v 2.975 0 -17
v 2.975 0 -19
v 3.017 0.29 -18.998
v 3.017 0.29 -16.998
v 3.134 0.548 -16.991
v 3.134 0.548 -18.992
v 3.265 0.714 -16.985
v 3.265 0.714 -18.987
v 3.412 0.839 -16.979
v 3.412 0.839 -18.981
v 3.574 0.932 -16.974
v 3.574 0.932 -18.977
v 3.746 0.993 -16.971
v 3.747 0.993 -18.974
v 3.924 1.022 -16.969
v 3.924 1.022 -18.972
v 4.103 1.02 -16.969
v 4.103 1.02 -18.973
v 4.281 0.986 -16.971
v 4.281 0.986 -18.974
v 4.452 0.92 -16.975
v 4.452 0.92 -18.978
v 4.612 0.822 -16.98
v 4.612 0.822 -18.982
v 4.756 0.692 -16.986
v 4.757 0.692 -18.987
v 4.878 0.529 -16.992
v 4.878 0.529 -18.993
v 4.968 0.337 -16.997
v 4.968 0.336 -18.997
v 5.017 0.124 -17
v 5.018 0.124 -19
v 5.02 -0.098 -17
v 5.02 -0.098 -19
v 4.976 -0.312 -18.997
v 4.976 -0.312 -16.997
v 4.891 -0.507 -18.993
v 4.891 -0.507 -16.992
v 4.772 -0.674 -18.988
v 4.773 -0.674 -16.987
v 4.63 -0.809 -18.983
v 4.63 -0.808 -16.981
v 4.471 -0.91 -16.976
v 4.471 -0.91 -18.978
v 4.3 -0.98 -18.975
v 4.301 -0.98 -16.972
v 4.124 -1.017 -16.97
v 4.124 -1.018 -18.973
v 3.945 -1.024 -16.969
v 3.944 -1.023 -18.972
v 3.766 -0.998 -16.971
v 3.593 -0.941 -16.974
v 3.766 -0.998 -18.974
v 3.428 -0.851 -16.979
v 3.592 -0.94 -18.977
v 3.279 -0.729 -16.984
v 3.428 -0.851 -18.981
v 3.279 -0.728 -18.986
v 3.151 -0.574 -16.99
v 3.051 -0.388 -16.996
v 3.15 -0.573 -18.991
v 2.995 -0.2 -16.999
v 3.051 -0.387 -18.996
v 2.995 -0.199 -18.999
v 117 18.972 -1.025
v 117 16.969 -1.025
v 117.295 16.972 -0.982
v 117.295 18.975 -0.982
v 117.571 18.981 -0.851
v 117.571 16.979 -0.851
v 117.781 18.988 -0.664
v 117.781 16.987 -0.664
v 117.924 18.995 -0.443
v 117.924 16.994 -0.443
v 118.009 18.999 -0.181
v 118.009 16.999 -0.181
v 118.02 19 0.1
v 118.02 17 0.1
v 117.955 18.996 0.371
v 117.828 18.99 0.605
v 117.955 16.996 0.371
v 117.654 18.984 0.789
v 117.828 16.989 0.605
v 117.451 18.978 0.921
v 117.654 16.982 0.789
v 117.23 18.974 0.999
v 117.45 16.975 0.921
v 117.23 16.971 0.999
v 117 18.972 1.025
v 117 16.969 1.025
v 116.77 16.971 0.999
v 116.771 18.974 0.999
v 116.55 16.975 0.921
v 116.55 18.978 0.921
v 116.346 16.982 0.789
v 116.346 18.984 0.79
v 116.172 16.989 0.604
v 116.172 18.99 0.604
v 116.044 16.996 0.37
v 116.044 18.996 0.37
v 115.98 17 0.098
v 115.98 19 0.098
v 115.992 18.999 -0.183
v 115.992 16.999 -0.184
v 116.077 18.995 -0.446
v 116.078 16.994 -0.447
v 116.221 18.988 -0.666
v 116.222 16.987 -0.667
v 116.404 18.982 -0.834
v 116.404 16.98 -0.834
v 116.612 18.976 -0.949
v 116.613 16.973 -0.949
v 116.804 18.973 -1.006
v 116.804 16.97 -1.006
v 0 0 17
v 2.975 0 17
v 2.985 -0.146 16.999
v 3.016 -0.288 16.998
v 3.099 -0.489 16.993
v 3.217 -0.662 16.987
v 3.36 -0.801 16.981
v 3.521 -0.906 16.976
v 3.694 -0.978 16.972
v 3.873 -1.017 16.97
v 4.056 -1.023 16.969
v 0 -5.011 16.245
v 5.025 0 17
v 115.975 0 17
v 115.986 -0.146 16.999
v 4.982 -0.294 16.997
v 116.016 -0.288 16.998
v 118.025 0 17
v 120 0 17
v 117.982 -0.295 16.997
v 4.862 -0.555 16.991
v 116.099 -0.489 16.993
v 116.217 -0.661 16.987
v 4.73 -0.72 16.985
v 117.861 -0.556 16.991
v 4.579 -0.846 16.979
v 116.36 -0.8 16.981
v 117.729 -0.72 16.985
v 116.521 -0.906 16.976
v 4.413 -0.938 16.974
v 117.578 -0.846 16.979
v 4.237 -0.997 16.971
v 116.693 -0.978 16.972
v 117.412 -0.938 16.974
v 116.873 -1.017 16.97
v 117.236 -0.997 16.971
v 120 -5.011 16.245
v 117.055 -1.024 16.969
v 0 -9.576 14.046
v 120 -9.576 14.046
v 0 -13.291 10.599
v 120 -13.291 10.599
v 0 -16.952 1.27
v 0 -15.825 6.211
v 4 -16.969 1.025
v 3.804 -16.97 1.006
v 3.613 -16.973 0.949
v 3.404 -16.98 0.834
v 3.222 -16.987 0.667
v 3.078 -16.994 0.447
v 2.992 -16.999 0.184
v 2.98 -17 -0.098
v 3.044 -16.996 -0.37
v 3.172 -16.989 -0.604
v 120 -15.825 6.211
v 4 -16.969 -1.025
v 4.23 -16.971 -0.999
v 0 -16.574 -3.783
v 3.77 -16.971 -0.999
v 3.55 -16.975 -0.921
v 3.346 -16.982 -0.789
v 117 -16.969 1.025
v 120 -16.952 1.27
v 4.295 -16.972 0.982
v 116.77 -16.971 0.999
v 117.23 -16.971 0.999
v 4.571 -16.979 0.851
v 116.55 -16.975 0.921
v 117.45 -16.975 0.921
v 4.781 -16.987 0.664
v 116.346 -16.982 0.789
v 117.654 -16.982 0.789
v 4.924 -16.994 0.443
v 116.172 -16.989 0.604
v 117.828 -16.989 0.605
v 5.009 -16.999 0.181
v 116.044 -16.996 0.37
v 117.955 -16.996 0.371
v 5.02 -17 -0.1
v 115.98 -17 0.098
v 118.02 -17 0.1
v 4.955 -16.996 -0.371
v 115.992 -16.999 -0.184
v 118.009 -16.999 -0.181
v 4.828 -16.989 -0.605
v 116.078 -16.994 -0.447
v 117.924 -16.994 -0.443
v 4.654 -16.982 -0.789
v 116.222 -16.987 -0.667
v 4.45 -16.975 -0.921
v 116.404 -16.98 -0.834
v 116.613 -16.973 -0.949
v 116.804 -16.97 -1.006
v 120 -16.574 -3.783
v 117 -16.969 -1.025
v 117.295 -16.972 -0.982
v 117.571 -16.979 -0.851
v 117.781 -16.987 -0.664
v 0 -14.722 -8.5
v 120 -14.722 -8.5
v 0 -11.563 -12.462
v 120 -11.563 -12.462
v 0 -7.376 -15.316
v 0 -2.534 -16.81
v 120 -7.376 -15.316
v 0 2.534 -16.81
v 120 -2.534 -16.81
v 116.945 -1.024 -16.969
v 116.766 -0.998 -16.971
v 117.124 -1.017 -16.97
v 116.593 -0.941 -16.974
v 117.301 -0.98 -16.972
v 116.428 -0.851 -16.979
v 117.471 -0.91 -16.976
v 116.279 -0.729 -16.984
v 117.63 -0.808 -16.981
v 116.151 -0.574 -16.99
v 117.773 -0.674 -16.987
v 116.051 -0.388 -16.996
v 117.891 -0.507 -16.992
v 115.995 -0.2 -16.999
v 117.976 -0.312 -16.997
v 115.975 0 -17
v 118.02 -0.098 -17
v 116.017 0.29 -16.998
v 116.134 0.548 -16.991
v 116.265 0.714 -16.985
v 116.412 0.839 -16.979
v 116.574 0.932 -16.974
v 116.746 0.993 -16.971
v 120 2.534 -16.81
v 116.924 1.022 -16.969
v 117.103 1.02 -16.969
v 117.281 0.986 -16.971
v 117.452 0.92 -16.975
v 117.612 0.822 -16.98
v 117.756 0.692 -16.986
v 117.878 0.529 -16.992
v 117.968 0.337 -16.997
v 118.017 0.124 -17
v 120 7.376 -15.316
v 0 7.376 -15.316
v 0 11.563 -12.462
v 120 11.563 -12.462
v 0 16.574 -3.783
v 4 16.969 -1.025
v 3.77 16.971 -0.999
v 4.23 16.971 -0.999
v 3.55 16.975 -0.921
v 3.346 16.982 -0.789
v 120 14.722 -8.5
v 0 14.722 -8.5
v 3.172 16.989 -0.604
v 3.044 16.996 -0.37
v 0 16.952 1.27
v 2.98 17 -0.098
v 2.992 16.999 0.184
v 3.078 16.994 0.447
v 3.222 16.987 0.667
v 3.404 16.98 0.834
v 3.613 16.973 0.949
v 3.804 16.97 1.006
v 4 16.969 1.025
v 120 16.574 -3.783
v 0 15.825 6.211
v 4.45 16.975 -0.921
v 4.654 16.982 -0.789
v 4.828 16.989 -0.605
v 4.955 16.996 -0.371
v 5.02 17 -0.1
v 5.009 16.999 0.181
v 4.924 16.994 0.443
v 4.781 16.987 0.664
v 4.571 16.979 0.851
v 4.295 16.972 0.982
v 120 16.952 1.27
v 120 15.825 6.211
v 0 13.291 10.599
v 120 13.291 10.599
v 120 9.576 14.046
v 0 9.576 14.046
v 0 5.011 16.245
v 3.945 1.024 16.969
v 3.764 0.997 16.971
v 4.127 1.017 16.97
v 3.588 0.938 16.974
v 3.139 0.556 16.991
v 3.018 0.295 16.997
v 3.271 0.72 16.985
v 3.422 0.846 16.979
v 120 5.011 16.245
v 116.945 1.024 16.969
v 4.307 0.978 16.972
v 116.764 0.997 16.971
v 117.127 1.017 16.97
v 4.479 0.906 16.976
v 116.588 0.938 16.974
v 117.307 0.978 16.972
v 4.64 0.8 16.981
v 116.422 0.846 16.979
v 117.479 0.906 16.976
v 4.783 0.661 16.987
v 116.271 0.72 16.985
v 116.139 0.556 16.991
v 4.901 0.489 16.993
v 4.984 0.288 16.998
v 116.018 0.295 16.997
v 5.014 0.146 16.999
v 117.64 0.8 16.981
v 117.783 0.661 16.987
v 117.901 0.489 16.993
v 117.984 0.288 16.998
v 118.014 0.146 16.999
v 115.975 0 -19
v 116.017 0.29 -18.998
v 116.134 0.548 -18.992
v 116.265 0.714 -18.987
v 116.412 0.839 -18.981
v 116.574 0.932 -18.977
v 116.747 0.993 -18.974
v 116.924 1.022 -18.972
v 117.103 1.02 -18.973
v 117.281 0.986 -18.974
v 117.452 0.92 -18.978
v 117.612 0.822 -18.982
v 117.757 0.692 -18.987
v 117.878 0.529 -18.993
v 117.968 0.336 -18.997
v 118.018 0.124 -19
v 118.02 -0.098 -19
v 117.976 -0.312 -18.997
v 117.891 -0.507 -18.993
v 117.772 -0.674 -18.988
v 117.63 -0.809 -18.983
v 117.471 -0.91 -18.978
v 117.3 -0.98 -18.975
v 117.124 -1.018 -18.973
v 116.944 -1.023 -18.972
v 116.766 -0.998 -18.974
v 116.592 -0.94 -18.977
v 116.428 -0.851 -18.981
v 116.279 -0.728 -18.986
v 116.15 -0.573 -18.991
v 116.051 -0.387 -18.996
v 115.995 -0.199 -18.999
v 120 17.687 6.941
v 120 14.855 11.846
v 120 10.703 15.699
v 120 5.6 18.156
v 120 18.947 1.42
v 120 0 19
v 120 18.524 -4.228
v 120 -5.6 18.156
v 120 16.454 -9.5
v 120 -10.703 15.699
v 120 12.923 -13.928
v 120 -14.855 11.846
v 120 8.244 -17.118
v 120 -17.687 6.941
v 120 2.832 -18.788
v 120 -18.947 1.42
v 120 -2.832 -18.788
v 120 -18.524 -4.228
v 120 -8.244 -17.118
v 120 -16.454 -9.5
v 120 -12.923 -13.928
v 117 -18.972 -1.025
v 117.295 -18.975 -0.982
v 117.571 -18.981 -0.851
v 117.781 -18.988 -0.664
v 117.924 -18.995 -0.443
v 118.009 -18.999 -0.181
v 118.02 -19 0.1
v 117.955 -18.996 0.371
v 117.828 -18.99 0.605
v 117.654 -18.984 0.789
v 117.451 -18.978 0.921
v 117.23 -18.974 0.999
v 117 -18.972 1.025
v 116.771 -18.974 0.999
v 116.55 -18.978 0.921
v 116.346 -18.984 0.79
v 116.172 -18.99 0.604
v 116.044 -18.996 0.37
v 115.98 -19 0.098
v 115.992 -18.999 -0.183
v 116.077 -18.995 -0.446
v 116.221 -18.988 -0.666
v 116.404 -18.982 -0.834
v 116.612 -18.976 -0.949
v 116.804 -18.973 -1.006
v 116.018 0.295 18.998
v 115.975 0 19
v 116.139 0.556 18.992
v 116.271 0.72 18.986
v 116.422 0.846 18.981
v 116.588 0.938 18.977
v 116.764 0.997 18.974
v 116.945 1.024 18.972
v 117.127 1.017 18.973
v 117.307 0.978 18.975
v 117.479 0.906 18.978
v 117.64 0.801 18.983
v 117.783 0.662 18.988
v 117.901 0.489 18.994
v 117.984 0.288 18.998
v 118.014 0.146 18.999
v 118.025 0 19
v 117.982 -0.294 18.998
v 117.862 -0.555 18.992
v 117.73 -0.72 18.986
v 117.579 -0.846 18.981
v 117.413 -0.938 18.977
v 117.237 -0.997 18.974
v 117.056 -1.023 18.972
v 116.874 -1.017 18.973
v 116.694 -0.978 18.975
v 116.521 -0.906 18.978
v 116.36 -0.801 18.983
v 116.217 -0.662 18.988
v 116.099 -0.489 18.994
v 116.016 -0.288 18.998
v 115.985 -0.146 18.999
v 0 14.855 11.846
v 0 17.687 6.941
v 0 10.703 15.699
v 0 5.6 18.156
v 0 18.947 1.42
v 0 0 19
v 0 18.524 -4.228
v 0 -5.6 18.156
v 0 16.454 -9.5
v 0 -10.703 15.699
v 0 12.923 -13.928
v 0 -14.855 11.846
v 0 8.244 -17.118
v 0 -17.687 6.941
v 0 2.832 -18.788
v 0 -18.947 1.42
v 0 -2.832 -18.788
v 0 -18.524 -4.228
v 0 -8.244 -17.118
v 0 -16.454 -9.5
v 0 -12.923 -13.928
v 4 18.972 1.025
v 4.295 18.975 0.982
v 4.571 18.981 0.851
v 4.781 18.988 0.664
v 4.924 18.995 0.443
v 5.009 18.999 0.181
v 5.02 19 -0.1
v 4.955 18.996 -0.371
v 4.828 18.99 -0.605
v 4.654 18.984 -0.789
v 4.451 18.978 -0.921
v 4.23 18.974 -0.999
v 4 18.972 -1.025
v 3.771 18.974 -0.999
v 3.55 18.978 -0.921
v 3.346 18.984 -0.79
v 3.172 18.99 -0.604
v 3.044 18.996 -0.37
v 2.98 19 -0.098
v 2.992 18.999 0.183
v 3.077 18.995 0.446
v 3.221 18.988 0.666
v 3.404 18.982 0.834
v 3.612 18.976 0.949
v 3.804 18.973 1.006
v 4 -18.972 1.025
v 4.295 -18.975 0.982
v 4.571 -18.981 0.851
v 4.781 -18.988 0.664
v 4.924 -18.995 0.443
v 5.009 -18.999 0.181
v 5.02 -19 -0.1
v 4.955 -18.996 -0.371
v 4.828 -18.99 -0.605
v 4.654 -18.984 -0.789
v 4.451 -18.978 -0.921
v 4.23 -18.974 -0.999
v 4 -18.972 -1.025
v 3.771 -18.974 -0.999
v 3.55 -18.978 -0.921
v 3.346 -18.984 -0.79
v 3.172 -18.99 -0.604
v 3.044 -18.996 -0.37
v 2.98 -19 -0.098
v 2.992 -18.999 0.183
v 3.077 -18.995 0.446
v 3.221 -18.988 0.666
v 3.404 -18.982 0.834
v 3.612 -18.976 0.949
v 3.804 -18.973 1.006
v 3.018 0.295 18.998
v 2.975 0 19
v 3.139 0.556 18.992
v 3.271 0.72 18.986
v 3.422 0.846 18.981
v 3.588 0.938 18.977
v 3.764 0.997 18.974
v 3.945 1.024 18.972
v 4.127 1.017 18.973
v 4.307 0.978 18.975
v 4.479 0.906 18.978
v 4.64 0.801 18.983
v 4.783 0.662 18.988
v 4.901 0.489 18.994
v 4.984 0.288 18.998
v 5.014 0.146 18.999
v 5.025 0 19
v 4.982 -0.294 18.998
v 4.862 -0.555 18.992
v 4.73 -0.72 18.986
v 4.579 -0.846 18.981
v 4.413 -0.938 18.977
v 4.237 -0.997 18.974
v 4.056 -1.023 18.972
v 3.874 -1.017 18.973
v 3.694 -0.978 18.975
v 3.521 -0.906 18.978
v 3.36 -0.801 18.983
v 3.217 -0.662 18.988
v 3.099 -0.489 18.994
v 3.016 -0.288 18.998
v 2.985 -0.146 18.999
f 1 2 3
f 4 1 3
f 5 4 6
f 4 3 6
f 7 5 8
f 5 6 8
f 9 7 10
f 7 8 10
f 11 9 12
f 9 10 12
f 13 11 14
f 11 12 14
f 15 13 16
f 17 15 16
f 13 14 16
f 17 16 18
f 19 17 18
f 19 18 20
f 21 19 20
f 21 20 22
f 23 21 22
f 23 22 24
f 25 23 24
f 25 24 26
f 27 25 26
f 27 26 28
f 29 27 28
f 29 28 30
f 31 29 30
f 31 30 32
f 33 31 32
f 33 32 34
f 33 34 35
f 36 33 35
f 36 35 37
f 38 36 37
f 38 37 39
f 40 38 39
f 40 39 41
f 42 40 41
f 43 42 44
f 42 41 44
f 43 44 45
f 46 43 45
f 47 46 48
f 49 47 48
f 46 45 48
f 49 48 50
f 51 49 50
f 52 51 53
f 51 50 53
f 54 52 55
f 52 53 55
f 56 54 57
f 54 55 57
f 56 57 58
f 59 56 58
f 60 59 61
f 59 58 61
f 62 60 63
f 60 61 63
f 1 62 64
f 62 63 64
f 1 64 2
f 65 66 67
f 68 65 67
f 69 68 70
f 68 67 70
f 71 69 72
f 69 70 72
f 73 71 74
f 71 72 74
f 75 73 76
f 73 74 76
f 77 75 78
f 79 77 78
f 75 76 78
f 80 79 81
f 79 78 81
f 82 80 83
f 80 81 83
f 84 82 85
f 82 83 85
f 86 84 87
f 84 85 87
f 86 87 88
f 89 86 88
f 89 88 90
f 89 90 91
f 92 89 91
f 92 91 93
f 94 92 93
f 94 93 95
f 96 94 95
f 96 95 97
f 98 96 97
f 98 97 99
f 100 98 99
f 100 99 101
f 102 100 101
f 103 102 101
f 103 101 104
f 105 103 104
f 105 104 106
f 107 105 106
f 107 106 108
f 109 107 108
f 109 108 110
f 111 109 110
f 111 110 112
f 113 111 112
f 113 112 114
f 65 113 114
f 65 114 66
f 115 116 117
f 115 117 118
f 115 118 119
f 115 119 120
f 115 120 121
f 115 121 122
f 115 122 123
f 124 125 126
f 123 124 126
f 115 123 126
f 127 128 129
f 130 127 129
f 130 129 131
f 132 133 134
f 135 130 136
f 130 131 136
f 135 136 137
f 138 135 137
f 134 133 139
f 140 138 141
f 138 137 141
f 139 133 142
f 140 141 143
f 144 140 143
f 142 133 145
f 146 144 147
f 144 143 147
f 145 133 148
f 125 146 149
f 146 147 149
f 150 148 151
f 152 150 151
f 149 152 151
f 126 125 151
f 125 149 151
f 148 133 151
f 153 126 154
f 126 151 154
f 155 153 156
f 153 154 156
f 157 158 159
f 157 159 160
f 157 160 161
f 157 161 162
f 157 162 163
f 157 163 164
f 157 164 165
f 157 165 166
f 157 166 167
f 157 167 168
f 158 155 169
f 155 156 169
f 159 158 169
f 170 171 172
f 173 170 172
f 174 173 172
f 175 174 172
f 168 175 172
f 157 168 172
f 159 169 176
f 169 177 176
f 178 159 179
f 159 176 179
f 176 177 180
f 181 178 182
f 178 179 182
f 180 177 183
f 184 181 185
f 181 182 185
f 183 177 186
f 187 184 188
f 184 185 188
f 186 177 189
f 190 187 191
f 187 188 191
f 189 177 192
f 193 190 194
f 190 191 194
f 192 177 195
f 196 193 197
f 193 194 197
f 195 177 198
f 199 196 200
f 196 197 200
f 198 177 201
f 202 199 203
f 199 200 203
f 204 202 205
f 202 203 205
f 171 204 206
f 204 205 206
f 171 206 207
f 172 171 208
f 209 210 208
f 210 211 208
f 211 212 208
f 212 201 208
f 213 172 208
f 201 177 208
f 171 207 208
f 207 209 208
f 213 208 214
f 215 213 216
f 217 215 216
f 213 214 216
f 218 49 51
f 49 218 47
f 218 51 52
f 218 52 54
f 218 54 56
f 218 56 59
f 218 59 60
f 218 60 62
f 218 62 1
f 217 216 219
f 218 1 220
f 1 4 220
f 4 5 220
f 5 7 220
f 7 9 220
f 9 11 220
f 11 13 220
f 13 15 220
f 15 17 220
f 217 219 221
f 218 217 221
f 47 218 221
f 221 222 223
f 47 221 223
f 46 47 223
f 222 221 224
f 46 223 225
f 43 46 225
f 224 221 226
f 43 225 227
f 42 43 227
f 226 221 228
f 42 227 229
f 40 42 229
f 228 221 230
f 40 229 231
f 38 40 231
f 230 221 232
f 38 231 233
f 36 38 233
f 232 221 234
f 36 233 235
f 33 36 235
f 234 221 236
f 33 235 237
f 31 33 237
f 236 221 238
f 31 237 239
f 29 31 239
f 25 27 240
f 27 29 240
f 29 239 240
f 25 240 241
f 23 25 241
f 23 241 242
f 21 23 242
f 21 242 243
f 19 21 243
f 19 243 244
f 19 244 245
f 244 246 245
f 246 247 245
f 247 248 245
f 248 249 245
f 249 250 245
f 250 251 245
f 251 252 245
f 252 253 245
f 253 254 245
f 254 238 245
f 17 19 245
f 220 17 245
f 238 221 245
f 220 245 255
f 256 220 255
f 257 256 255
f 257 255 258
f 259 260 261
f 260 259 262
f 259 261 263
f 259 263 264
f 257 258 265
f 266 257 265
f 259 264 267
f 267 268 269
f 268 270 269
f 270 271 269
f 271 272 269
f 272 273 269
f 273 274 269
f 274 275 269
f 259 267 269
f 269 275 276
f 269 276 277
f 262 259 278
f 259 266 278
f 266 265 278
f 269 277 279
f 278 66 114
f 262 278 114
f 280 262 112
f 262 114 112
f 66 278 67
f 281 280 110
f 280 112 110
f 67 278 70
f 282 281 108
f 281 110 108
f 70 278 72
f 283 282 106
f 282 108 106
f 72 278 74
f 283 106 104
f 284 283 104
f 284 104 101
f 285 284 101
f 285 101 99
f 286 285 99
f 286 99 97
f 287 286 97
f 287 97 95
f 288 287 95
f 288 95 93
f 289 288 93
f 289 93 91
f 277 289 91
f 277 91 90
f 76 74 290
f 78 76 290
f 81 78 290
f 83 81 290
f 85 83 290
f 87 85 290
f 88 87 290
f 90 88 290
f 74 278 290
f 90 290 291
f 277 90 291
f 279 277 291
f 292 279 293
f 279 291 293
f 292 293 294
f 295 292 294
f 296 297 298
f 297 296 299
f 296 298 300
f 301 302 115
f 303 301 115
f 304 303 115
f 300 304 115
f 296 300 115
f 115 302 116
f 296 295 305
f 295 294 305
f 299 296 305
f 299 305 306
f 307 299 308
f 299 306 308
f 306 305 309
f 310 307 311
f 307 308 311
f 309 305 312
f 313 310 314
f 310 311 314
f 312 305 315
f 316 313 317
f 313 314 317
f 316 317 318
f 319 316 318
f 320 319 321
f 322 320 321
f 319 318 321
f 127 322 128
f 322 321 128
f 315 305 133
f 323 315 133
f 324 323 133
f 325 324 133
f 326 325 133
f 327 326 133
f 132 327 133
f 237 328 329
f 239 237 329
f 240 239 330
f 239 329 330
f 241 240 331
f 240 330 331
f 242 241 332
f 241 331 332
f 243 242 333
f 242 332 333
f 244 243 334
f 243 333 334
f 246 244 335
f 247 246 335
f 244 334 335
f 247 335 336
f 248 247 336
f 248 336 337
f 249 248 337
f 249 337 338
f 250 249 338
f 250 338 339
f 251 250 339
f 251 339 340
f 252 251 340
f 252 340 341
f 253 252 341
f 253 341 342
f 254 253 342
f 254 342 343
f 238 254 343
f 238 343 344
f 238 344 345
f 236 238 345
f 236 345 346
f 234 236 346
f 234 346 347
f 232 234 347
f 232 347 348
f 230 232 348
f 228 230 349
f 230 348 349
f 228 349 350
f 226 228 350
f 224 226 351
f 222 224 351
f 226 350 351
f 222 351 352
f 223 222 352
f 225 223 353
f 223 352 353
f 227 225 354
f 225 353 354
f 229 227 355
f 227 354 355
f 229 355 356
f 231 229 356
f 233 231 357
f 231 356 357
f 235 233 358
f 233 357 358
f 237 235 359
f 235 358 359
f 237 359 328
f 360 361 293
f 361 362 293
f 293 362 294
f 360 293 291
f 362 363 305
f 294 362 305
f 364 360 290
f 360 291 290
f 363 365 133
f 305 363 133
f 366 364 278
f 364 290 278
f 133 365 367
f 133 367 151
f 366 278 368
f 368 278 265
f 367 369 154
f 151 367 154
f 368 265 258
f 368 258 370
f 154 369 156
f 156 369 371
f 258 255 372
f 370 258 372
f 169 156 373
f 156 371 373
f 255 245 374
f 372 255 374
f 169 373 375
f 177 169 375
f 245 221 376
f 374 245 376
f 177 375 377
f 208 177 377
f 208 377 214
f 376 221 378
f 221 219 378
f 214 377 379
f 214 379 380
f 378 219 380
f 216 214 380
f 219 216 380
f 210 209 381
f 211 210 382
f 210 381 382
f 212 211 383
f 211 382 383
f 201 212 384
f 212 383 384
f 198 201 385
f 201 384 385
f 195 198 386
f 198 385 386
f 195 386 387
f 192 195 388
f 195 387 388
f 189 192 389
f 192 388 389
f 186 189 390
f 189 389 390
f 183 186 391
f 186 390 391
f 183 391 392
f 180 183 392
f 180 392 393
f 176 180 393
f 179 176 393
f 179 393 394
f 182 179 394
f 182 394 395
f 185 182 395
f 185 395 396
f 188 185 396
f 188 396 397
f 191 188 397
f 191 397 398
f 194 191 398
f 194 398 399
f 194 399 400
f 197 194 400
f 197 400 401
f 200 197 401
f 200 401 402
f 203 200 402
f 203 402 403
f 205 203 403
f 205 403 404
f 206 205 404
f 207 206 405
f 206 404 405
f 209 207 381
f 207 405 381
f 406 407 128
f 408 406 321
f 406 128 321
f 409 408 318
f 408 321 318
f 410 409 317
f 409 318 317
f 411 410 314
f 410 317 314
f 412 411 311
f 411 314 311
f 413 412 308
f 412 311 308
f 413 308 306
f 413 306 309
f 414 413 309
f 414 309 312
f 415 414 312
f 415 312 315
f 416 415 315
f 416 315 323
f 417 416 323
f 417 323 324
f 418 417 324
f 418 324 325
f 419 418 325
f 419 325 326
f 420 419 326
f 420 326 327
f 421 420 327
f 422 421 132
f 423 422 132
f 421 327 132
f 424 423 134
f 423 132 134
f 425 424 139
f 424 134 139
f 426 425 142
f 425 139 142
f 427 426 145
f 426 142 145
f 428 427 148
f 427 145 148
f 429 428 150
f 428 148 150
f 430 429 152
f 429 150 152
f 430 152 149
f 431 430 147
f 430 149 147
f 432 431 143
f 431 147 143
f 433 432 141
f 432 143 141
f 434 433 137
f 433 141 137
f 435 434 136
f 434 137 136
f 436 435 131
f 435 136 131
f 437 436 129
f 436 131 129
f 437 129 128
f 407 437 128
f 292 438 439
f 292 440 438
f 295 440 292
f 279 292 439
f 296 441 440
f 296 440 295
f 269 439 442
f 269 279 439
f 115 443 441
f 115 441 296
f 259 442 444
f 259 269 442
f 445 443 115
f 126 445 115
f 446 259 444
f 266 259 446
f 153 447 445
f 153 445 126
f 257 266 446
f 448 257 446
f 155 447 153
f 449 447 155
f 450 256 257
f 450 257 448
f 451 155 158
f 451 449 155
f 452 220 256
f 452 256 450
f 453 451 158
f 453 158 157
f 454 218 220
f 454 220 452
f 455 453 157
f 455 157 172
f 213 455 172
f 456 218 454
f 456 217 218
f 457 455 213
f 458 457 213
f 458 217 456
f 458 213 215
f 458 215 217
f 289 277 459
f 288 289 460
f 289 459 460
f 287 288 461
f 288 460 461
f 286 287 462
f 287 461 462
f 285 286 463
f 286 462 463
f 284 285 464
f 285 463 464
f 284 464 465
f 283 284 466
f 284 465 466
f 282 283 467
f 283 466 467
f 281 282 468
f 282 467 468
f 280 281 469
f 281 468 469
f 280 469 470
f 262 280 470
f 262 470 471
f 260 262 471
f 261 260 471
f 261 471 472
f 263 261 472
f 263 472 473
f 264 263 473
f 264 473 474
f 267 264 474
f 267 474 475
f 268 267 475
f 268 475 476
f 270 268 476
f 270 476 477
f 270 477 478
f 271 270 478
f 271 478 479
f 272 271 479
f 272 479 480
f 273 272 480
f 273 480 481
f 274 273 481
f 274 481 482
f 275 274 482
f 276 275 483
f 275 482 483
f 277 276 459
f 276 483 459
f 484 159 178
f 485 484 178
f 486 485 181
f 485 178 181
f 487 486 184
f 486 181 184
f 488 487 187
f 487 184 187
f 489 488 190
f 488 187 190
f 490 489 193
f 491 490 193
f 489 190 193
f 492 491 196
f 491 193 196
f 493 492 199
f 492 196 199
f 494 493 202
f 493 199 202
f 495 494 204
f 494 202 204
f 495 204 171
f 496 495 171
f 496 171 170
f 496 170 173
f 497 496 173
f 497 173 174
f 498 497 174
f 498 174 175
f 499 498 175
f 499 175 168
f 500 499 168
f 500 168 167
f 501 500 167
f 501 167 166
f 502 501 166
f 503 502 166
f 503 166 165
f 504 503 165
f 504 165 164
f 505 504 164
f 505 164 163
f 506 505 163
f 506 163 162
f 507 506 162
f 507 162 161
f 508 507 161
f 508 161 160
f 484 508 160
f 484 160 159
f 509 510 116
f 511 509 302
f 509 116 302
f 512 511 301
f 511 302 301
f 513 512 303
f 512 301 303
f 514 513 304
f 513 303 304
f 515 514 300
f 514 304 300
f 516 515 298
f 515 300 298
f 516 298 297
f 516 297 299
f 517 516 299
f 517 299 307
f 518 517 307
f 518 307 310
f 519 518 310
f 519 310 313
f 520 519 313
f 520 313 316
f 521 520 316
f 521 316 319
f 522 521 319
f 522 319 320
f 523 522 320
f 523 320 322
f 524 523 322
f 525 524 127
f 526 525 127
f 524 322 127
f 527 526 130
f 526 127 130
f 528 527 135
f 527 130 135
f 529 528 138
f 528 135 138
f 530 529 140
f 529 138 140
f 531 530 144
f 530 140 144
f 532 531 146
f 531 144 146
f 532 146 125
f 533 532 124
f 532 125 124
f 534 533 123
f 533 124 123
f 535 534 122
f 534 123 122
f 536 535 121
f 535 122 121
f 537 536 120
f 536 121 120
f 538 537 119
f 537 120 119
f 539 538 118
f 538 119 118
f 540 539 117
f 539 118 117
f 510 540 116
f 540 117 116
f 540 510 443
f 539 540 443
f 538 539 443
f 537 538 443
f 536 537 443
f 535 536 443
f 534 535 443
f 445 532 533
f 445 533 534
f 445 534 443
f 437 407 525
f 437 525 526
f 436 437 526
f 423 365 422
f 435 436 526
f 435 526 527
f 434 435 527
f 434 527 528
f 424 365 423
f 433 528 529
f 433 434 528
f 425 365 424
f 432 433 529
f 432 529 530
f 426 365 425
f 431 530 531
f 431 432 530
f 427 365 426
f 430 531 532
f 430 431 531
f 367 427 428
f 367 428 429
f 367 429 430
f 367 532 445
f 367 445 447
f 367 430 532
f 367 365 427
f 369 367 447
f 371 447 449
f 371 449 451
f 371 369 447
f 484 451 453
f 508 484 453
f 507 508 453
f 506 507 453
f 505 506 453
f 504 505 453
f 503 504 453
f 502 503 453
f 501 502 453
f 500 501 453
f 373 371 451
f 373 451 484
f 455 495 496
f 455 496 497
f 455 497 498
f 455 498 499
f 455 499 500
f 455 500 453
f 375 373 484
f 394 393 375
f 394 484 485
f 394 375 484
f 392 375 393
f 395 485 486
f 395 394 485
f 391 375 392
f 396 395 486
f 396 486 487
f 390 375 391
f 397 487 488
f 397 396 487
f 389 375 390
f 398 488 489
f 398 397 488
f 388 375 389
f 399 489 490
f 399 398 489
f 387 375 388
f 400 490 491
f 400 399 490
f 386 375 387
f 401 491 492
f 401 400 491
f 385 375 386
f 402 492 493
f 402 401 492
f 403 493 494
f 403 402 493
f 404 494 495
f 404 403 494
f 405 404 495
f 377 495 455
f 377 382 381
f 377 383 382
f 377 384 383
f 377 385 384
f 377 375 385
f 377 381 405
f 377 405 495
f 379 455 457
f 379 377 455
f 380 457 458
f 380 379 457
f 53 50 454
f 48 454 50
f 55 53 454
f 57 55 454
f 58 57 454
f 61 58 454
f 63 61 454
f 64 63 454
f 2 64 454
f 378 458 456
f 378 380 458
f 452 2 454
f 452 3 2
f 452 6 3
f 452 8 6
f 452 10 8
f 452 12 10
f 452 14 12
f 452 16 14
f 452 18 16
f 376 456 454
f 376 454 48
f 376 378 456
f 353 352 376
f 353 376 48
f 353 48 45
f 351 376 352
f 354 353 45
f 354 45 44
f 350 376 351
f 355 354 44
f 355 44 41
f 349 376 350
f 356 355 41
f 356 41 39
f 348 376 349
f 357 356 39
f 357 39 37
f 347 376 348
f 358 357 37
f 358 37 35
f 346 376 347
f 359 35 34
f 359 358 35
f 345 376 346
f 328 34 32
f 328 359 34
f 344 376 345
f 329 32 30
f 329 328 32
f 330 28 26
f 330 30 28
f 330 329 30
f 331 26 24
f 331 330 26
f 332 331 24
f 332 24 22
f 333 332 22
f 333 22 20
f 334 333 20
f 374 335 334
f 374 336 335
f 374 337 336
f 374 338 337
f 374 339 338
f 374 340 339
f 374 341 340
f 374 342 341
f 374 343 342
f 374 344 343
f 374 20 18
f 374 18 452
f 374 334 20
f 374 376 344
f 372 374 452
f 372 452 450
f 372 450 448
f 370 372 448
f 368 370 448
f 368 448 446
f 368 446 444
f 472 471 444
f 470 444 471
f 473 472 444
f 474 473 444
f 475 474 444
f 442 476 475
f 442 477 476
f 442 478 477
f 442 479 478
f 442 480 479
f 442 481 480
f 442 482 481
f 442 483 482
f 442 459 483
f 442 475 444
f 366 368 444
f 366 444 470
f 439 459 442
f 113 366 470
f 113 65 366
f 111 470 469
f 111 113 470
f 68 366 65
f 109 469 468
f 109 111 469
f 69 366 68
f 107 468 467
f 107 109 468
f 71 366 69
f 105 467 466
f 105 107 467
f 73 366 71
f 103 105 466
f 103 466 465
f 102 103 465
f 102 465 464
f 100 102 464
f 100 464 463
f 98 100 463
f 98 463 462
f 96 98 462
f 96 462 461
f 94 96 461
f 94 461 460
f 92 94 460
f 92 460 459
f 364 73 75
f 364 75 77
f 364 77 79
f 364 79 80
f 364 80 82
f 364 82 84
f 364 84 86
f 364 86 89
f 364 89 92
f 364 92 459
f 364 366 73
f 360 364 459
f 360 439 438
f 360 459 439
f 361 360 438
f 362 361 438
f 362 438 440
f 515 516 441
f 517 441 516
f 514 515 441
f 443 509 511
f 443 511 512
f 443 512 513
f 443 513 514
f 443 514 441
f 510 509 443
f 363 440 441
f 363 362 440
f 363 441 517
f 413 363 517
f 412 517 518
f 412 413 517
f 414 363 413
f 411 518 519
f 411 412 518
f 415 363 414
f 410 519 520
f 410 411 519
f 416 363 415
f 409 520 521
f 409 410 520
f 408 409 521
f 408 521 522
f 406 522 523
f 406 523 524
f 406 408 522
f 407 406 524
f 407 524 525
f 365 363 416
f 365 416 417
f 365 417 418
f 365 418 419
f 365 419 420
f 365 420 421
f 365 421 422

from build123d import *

# Parameters (mm, degrees)
SKETCH1_W                     = 120
SKETCH1_H                     = 2
M2_5_TAPPED_HOLE1_D           = 2.05
M2_5_TAPPED_HOLE1_ON_FACE_2_D = 2.05
M2_5_TAPPED_HOLE2_D           = 2.05
M2_5_TAPPED_HOLE2_ON_FACE_2_D = 2.05


with BuildPart() as part:
    # Sketch1 → Revolve1 (revolve)
    with BuildSketch(Plane.XY):
        with Locations((60, 18)):
            Rectangle(SKETCH1_W, SKETCH1_H)
    revolve(axis=Axis((-97.700575873, 0, 0), (1, 0, 0)))

    # M2.5 Tapped Hole1 (through all)
    with Locations(Plane(origin=(4, 0, 19), x_dir=(1, 0, 0), z_dir=(0, 0, 1))):
        with Locations((0, 0)):
            Hole(M2_5_TAPPED_HOLE1_D / 2)

    # M2.5 Tapped Hole1 on face 2 (through all)
    with Locations(Plane(origin=(4, -19, 0), x_dir=(0, 0, -1), z_dir=(0, -1, 0))):
        with Locations((0, 0)):
            Hole(M2_5_TAPPED_HOLE1_ON_FACE_2_D / 2)

    # M2.5 Tapped Hole2 (through all)
    with Locations(Plane(origin=(117, 19, 0), x_dir=(0, 0, 1), z_dir=(0, 1, 0))):
        with Locations((0, 0)):
            Hole(M2_5_TAPPED_HOLE2_D / 2)

    # M2.5 Tapped Hole2 on face 2 (through all)
    with Locations(Plane(origin=(117, 0, 19), x_dir=(1, 0, 0), z_dir=(0, 0, 1))):
        with Locations((0, 0)):
            Hole(M2_5_TAPPED_HOLE2_ON_FACE_2_D / 2)


solid = part.part
